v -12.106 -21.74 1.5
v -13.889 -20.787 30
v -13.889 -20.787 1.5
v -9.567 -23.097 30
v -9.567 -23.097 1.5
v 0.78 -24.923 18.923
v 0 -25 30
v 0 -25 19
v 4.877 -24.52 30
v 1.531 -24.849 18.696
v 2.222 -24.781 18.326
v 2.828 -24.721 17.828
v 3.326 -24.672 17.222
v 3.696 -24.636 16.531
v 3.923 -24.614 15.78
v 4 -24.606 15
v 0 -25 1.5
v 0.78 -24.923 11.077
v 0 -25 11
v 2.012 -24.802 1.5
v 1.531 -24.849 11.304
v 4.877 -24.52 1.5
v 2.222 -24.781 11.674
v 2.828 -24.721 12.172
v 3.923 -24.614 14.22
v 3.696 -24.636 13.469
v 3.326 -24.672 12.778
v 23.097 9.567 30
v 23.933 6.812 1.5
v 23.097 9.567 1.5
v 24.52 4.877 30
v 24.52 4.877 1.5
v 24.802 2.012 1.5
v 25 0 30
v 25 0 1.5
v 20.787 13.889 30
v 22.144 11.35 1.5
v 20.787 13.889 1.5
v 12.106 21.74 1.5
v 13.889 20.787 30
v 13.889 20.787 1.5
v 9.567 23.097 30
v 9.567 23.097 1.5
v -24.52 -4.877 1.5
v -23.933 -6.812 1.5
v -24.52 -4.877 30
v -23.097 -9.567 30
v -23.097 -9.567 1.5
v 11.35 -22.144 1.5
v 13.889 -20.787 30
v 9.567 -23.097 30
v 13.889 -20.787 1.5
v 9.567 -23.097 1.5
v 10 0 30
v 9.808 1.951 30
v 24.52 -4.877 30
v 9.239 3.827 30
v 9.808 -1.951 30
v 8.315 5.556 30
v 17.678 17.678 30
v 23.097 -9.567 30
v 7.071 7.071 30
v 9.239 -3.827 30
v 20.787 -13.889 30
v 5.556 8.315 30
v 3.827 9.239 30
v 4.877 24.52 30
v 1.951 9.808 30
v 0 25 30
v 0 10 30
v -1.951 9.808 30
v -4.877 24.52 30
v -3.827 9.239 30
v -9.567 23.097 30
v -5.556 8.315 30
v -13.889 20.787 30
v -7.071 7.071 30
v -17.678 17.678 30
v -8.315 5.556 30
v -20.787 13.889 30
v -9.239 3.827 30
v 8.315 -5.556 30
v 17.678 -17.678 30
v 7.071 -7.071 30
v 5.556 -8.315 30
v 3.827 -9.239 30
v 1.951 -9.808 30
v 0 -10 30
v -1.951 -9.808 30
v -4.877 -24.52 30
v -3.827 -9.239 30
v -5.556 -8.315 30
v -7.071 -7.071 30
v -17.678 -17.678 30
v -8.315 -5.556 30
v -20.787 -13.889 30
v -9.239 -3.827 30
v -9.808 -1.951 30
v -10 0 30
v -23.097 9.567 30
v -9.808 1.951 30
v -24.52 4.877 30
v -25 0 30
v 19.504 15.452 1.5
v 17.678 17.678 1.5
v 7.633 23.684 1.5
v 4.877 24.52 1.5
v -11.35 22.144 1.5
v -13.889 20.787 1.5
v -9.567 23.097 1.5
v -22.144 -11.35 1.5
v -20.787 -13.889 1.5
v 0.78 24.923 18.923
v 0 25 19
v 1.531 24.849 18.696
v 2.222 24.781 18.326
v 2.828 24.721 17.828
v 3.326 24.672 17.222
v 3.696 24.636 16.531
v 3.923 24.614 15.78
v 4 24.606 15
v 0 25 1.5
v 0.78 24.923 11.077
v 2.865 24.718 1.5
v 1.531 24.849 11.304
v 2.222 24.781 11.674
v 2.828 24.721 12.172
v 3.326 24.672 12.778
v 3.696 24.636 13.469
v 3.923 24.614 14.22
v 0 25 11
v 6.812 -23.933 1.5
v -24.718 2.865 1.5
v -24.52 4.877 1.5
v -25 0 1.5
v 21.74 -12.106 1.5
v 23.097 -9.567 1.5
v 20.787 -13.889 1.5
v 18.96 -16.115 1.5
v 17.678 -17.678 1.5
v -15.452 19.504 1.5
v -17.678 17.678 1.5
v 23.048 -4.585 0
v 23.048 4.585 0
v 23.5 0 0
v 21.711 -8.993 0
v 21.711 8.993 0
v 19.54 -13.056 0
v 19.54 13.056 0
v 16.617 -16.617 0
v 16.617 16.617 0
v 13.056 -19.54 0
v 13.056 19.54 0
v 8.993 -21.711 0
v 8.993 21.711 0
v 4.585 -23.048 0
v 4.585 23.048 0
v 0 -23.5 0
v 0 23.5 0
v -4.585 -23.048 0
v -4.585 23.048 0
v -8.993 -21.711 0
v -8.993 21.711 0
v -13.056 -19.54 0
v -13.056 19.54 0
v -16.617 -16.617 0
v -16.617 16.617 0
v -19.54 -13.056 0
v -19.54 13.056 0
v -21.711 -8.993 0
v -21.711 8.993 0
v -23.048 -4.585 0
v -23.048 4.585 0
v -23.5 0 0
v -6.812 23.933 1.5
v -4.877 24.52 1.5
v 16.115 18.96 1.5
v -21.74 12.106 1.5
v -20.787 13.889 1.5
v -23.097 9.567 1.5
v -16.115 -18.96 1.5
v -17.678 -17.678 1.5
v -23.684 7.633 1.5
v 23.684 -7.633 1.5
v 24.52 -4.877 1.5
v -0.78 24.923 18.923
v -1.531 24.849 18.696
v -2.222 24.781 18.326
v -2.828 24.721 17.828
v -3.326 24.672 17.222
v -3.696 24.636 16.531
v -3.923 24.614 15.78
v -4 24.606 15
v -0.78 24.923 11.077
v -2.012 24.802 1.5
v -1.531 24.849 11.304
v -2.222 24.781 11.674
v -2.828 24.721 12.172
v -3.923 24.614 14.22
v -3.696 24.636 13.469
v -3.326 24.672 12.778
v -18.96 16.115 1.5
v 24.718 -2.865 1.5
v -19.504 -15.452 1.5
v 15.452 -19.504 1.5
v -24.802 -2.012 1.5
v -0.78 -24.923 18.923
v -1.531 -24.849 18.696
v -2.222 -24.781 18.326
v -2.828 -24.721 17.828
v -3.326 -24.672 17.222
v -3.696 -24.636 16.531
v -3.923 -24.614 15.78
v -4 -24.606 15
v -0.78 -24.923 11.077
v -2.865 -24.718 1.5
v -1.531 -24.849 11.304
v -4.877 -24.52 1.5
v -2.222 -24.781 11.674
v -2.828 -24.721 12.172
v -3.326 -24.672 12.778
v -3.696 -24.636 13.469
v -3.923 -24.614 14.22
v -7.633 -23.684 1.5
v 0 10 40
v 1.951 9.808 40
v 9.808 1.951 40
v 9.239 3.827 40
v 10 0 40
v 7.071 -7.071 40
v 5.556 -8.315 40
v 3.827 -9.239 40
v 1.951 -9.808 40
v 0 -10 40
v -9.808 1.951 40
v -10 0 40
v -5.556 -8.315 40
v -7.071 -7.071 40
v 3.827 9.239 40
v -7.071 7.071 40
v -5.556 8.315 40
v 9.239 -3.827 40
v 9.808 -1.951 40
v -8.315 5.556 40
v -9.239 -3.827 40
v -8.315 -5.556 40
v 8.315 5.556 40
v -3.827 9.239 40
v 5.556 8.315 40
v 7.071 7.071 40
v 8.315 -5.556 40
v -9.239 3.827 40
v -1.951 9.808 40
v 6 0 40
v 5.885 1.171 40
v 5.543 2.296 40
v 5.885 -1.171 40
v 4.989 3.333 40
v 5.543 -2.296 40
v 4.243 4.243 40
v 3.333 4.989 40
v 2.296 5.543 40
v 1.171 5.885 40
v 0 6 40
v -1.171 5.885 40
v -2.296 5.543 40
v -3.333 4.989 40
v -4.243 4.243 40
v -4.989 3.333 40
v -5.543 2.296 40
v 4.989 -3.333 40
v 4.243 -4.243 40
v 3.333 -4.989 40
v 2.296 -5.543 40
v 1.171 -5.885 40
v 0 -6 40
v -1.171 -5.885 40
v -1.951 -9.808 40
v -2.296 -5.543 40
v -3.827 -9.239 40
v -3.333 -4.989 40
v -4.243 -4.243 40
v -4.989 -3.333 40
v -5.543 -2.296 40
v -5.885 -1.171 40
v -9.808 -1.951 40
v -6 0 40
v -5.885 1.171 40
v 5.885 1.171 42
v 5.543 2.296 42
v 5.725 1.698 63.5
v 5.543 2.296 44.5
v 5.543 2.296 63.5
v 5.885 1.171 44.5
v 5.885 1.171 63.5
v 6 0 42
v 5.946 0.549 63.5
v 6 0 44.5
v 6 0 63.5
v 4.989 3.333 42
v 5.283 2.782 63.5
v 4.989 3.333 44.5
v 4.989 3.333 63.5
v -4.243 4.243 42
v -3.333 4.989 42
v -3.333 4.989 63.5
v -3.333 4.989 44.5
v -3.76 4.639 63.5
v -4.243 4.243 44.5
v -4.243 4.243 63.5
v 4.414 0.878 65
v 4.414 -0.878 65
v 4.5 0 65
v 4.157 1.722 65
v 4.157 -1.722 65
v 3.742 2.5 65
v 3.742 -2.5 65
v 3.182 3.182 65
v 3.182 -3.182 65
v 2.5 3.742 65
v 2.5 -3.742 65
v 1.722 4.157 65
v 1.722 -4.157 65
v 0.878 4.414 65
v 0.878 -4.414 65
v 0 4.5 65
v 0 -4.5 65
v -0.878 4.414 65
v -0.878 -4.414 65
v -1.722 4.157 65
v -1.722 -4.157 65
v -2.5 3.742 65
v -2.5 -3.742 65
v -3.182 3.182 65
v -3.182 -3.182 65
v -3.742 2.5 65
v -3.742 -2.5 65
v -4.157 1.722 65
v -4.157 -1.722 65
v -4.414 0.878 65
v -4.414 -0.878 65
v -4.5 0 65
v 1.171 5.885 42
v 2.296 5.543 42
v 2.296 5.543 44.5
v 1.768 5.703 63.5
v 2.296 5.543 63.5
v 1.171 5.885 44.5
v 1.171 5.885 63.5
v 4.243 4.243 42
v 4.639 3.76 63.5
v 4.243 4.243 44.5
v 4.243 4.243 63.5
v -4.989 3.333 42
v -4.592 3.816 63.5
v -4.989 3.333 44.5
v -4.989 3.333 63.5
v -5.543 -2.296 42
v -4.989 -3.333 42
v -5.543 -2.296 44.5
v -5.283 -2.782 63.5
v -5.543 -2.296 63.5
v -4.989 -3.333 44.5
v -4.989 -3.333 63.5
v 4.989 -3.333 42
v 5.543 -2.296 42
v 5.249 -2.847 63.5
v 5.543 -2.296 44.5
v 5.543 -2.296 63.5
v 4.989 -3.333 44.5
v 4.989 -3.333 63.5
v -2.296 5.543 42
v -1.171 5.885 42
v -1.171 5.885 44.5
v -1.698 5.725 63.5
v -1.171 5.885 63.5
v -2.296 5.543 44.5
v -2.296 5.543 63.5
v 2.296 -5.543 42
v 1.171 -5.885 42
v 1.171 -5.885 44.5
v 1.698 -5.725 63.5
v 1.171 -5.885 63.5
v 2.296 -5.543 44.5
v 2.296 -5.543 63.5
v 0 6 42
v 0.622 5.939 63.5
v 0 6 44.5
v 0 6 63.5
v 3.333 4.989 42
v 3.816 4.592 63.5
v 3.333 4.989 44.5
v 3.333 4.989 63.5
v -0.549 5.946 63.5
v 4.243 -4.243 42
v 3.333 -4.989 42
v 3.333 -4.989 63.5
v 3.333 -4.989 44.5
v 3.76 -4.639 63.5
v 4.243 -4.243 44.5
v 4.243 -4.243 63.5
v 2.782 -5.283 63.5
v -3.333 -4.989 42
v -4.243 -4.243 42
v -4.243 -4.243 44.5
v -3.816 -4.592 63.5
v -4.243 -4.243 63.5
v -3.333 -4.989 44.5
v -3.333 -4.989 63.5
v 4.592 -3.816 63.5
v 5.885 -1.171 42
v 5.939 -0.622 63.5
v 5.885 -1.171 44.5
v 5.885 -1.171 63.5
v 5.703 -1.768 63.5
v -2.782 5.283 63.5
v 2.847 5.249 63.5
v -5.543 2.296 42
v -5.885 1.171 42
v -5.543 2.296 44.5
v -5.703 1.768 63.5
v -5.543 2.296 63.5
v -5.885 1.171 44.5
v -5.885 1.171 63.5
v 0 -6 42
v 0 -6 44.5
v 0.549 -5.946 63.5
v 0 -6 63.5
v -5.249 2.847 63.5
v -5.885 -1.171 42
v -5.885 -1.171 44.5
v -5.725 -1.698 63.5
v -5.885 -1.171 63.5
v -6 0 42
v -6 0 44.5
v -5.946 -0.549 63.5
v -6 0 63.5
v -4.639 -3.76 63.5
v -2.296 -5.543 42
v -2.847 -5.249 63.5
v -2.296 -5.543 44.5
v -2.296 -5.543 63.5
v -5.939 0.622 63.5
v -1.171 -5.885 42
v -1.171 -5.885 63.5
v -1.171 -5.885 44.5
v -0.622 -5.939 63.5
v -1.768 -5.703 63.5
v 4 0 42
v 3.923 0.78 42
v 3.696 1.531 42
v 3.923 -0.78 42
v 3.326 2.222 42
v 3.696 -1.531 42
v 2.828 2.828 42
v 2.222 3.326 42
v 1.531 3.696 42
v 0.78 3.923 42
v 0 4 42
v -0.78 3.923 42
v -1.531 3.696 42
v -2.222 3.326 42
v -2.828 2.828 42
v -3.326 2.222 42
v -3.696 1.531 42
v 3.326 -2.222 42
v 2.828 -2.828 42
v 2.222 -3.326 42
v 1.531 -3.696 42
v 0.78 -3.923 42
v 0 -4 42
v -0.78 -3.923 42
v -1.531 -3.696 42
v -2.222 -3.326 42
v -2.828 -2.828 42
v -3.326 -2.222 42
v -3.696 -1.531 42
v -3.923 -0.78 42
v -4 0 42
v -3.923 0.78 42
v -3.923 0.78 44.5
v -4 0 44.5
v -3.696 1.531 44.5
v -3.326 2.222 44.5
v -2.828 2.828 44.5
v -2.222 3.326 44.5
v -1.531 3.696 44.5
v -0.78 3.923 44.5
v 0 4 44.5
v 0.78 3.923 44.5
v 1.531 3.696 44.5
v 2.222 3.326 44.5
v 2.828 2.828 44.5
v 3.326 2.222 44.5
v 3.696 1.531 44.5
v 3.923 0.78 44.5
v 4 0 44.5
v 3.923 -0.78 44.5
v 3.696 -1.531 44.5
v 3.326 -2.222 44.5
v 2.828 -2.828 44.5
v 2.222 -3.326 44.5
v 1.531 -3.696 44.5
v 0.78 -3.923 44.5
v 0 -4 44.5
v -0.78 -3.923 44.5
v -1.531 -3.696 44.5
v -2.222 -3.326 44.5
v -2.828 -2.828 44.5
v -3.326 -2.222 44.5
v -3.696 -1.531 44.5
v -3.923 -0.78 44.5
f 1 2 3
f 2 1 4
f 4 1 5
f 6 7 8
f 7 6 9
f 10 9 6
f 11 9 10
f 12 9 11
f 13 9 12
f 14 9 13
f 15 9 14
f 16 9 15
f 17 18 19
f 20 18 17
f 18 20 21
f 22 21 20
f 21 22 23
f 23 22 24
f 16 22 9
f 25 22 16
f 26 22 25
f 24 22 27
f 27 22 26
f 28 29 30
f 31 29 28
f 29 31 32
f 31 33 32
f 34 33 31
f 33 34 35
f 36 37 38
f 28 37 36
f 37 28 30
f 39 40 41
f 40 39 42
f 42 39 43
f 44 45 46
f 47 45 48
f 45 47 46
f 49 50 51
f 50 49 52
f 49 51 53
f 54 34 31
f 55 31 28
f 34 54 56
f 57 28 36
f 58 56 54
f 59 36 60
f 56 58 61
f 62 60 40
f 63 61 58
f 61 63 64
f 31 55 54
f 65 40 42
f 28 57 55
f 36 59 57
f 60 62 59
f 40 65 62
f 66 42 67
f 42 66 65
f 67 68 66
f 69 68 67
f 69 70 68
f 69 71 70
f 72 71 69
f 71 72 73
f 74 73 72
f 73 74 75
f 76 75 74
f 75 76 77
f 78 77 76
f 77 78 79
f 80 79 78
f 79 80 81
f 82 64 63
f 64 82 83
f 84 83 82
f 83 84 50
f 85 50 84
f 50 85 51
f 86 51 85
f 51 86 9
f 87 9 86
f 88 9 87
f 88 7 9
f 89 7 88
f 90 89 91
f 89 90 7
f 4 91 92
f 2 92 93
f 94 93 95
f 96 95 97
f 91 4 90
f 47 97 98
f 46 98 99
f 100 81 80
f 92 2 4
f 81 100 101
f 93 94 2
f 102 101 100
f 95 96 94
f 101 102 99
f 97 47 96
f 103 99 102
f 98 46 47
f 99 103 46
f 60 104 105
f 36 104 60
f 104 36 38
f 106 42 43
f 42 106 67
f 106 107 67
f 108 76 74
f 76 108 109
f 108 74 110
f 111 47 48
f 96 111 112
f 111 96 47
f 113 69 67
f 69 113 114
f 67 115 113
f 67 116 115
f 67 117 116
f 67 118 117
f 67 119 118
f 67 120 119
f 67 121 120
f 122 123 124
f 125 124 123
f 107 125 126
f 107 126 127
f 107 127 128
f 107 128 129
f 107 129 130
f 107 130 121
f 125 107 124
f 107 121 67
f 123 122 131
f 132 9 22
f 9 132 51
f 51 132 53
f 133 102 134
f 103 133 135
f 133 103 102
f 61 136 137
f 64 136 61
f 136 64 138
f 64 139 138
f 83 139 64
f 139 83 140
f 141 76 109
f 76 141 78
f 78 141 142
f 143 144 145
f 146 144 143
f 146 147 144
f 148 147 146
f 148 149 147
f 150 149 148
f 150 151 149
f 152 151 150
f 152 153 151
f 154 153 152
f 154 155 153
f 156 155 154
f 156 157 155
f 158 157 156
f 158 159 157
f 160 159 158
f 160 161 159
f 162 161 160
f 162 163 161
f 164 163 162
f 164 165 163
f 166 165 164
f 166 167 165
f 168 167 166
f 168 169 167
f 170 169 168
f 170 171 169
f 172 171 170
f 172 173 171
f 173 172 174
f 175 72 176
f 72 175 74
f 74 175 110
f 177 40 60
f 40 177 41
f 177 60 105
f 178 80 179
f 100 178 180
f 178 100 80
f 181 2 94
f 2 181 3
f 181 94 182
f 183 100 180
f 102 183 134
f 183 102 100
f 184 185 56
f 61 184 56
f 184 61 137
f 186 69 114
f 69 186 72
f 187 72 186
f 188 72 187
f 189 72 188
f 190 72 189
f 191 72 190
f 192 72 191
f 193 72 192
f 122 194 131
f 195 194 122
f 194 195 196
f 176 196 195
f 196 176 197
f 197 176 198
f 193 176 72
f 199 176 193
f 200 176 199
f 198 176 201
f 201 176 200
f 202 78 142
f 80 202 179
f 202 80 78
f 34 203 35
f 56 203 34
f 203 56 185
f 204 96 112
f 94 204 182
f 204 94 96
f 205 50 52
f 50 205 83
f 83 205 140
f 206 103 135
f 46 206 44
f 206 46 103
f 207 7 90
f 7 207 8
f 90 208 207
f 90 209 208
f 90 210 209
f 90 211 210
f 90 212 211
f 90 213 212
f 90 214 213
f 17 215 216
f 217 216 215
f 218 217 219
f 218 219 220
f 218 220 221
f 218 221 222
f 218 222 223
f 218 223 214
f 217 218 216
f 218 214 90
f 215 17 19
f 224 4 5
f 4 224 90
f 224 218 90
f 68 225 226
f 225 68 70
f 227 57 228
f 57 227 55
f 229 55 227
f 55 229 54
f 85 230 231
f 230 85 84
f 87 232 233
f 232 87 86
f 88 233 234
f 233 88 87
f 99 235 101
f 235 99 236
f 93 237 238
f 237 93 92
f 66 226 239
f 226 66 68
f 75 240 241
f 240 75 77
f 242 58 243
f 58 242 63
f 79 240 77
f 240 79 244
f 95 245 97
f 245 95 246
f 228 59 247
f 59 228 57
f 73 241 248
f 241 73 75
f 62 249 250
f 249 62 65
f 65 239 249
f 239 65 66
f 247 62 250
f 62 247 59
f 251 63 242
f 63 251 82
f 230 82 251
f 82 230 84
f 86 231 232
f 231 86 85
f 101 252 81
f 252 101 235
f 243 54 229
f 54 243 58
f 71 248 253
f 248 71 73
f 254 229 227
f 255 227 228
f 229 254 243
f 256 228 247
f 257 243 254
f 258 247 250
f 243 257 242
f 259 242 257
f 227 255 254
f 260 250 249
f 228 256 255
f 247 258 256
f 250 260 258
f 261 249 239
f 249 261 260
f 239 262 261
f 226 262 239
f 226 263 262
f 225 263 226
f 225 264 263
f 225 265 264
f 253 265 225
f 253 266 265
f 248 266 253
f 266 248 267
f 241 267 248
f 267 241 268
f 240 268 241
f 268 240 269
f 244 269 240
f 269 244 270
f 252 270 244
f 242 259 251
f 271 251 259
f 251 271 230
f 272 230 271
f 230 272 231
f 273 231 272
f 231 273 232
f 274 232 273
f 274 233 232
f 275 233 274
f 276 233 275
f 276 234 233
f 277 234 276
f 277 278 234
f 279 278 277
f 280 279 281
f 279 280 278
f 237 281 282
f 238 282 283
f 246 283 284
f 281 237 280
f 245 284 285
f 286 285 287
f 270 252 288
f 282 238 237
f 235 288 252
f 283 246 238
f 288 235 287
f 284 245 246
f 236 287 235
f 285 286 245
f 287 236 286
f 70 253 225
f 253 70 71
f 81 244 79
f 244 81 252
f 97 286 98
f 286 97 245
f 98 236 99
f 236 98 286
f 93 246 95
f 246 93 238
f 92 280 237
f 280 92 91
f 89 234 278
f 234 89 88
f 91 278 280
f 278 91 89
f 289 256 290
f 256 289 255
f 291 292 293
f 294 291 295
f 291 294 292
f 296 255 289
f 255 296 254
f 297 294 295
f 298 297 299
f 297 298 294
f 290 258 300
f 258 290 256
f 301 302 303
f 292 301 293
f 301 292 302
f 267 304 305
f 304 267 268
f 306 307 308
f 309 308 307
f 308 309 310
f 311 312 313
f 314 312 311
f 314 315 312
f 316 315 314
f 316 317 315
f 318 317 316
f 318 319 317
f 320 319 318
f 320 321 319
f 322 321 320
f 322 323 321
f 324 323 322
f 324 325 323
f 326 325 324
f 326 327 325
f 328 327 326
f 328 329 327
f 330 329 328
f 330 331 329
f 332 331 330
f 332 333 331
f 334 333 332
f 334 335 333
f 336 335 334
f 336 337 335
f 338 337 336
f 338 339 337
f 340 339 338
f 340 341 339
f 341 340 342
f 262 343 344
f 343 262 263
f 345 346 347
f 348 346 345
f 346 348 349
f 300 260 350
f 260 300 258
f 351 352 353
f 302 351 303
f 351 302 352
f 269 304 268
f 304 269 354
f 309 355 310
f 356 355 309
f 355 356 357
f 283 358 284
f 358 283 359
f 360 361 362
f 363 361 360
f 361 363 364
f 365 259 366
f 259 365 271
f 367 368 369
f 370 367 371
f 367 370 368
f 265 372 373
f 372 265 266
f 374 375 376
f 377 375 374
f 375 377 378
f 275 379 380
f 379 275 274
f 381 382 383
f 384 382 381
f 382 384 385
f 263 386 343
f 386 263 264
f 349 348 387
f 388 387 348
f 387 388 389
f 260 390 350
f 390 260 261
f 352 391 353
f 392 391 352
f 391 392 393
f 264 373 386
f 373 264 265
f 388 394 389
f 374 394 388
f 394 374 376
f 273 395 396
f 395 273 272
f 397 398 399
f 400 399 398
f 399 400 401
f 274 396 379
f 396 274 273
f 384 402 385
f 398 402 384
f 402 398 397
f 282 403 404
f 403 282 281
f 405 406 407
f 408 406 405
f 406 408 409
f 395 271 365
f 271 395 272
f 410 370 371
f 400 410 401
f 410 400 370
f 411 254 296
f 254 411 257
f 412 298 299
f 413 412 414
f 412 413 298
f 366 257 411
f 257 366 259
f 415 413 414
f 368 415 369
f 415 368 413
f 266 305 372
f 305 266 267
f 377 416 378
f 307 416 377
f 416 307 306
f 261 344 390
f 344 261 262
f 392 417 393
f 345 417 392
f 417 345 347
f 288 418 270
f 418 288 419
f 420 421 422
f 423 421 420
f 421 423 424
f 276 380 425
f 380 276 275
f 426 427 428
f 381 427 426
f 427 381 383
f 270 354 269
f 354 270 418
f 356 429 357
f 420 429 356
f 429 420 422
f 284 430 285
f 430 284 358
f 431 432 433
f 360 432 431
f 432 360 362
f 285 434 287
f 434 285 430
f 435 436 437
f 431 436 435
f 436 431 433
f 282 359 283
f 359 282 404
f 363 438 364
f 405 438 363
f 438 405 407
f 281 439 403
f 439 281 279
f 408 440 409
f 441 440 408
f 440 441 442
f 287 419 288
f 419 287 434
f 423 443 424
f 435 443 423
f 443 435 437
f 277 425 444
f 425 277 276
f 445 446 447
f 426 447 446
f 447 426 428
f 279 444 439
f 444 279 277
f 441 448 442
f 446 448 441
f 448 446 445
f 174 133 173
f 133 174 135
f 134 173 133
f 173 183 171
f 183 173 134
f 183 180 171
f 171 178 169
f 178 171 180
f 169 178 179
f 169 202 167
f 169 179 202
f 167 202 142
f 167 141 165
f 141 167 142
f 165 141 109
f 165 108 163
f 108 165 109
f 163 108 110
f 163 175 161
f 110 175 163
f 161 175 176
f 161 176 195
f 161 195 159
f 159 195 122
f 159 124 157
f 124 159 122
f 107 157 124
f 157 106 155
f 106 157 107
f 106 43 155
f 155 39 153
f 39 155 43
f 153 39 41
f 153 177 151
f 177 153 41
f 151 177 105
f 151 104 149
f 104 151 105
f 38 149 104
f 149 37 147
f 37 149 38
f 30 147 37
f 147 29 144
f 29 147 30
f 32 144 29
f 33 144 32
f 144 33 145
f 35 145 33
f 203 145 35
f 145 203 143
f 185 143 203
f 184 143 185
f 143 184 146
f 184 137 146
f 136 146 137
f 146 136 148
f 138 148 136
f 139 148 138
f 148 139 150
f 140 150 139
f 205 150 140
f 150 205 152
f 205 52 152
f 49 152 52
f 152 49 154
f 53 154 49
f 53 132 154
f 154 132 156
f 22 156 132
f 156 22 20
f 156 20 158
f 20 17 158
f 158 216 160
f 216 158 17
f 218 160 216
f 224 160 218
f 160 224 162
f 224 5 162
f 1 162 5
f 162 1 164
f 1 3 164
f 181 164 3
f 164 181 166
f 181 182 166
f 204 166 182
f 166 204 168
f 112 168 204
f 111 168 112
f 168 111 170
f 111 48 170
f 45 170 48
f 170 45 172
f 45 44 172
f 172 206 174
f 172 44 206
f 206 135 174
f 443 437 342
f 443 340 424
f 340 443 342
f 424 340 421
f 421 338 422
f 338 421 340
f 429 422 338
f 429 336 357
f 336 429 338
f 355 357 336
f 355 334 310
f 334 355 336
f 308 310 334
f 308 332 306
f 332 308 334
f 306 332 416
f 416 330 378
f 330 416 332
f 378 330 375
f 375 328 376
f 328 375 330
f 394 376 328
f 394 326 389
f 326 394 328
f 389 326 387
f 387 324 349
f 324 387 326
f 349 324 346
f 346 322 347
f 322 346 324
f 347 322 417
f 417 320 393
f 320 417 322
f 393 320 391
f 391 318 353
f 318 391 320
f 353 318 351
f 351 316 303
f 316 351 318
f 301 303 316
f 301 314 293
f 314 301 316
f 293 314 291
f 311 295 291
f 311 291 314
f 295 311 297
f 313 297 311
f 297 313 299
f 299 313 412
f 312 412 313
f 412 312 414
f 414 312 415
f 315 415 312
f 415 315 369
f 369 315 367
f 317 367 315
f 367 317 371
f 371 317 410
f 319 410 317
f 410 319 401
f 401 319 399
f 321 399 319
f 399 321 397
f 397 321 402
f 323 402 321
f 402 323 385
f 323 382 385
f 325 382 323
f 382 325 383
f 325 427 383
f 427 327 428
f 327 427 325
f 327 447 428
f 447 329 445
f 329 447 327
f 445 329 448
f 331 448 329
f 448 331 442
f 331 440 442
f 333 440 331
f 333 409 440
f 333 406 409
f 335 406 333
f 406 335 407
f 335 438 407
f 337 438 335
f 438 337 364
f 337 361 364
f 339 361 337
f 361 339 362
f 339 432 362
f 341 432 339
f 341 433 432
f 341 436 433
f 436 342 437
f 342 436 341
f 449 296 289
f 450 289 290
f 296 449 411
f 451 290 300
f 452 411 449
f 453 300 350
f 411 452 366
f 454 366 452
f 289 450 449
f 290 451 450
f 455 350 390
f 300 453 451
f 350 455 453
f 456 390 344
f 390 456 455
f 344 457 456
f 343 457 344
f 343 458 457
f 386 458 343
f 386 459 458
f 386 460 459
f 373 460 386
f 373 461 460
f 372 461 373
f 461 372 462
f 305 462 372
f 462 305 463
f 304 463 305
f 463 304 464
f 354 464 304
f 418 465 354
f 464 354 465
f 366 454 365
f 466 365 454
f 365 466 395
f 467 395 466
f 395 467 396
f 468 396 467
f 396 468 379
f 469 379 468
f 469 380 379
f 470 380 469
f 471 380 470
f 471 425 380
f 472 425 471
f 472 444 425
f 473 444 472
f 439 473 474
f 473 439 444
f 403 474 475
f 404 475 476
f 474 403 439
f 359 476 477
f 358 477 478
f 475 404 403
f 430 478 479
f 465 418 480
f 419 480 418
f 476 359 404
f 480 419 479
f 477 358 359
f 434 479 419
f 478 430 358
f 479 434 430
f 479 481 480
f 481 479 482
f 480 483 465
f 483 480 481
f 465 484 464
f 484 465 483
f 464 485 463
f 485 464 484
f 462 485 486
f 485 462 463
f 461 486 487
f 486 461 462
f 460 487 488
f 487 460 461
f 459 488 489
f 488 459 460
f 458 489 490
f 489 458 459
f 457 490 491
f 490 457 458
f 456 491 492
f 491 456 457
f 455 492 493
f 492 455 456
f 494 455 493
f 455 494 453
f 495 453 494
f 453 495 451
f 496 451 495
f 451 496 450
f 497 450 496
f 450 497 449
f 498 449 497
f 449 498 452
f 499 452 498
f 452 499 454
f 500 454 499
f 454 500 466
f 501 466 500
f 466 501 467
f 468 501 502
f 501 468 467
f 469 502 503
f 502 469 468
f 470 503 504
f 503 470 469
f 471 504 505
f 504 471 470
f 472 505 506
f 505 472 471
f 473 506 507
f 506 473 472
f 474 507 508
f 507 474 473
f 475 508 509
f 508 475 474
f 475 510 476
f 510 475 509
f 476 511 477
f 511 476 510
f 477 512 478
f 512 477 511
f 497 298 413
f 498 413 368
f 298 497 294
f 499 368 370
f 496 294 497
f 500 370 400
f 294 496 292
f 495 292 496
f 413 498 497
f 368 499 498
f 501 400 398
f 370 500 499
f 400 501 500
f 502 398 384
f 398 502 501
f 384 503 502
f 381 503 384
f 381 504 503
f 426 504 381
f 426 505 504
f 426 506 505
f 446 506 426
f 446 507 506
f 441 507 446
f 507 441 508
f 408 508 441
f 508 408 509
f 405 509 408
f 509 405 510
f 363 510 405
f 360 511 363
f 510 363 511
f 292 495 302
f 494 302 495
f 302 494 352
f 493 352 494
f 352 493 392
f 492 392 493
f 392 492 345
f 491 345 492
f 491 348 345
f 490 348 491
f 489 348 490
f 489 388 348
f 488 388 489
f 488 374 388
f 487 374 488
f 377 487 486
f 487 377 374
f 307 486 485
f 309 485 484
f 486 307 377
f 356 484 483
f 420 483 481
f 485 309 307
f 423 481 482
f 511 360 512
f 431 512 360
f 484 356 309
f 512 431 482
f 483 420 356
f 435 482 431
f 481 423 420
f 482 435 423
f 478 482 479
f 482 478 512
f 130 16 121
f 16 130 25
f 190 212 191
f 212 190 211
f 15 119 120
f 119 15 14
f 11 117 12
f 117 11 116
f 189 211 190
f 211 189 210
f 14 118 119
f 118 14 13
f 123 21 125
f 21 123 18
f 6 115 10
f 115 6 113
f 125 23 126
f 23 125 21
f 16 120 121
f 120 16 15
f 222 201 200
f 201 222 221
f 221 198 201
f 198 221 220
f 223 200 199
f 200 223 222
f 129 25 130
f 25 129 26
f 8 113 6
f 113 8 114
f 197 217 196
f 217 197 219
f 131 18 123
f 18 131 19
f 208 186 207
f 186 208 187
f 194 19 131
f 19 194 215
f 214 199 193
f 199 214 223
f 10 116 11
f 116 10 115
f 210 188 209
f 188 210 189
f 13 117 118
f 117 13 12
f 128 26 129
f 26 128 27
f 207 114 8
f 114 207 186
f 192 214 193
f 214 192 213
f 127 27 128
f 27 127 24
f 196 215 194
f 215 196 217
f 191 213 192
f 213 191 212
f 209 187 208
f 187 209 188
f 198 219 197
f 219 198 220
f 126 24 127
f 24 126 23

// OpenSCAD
$fn = 32;

// ----------------------------------------------------------------------
// Stepped shaft: diameters 50, 20, 12 mm, 65 mm long
// ----------------------------------------------------------------------

// --- parameters (mm) ---
d1 = 50;                  // step 1 diameter
len1 = 30;                // step 1 length
d2 = 20;                  // step 2 diameter
len2 = 10;                // step 2 length
d3 = 12;                  // step 3 diameter
len3 = 25;                // step 3 length
total = 65;               // overall length
chamfer = 1.5;            // end chamfer
groove_r = 6;             // groove radius
groove_z = 42;            // groove position from the end
groove_w = 2.5;           // groove width
groove_d = 2;             // groove depth
cross_d = 8;              // cross pin hole
cross_z = 15;             // cross hole position

difference() {
  /* turned body: stacked cylinders, every step sunk into the bigger one */
  union() {
    cylinder(h = len1, d = d1);
    translate([0, 0, 29.6]) cylinder(h = 10.4, d = d2);
    translate([0, 0, 39.6]) cylinder(h = 25.4, d = d3);
  }
  /* bottom chamfer ring cut */
  rotate_extrude() translate([23.5, -2.5]) polygon([[0, 0], [4, 0], [4, 6.5], [0, 2.5]]);
  /* top chamfer ring cut */
  rotate_extrude() translate([4.5, 65]) polygon([[0, 0], [4, -4], [4, 2.5], [0, 2.5]]);
  /* circlip groove just behind the shoulder */
  rotate_extrude() translate([groove_r - groove_d, groove_z]) square([groove_d + 2.5, groove_w]);
  /* cross pin hole through the small step */
  translate([0, 0, cross_z]) rotate([90, 0, 0]) cylinder(h = d1 + 5, d = cross_d, center = true);
}
